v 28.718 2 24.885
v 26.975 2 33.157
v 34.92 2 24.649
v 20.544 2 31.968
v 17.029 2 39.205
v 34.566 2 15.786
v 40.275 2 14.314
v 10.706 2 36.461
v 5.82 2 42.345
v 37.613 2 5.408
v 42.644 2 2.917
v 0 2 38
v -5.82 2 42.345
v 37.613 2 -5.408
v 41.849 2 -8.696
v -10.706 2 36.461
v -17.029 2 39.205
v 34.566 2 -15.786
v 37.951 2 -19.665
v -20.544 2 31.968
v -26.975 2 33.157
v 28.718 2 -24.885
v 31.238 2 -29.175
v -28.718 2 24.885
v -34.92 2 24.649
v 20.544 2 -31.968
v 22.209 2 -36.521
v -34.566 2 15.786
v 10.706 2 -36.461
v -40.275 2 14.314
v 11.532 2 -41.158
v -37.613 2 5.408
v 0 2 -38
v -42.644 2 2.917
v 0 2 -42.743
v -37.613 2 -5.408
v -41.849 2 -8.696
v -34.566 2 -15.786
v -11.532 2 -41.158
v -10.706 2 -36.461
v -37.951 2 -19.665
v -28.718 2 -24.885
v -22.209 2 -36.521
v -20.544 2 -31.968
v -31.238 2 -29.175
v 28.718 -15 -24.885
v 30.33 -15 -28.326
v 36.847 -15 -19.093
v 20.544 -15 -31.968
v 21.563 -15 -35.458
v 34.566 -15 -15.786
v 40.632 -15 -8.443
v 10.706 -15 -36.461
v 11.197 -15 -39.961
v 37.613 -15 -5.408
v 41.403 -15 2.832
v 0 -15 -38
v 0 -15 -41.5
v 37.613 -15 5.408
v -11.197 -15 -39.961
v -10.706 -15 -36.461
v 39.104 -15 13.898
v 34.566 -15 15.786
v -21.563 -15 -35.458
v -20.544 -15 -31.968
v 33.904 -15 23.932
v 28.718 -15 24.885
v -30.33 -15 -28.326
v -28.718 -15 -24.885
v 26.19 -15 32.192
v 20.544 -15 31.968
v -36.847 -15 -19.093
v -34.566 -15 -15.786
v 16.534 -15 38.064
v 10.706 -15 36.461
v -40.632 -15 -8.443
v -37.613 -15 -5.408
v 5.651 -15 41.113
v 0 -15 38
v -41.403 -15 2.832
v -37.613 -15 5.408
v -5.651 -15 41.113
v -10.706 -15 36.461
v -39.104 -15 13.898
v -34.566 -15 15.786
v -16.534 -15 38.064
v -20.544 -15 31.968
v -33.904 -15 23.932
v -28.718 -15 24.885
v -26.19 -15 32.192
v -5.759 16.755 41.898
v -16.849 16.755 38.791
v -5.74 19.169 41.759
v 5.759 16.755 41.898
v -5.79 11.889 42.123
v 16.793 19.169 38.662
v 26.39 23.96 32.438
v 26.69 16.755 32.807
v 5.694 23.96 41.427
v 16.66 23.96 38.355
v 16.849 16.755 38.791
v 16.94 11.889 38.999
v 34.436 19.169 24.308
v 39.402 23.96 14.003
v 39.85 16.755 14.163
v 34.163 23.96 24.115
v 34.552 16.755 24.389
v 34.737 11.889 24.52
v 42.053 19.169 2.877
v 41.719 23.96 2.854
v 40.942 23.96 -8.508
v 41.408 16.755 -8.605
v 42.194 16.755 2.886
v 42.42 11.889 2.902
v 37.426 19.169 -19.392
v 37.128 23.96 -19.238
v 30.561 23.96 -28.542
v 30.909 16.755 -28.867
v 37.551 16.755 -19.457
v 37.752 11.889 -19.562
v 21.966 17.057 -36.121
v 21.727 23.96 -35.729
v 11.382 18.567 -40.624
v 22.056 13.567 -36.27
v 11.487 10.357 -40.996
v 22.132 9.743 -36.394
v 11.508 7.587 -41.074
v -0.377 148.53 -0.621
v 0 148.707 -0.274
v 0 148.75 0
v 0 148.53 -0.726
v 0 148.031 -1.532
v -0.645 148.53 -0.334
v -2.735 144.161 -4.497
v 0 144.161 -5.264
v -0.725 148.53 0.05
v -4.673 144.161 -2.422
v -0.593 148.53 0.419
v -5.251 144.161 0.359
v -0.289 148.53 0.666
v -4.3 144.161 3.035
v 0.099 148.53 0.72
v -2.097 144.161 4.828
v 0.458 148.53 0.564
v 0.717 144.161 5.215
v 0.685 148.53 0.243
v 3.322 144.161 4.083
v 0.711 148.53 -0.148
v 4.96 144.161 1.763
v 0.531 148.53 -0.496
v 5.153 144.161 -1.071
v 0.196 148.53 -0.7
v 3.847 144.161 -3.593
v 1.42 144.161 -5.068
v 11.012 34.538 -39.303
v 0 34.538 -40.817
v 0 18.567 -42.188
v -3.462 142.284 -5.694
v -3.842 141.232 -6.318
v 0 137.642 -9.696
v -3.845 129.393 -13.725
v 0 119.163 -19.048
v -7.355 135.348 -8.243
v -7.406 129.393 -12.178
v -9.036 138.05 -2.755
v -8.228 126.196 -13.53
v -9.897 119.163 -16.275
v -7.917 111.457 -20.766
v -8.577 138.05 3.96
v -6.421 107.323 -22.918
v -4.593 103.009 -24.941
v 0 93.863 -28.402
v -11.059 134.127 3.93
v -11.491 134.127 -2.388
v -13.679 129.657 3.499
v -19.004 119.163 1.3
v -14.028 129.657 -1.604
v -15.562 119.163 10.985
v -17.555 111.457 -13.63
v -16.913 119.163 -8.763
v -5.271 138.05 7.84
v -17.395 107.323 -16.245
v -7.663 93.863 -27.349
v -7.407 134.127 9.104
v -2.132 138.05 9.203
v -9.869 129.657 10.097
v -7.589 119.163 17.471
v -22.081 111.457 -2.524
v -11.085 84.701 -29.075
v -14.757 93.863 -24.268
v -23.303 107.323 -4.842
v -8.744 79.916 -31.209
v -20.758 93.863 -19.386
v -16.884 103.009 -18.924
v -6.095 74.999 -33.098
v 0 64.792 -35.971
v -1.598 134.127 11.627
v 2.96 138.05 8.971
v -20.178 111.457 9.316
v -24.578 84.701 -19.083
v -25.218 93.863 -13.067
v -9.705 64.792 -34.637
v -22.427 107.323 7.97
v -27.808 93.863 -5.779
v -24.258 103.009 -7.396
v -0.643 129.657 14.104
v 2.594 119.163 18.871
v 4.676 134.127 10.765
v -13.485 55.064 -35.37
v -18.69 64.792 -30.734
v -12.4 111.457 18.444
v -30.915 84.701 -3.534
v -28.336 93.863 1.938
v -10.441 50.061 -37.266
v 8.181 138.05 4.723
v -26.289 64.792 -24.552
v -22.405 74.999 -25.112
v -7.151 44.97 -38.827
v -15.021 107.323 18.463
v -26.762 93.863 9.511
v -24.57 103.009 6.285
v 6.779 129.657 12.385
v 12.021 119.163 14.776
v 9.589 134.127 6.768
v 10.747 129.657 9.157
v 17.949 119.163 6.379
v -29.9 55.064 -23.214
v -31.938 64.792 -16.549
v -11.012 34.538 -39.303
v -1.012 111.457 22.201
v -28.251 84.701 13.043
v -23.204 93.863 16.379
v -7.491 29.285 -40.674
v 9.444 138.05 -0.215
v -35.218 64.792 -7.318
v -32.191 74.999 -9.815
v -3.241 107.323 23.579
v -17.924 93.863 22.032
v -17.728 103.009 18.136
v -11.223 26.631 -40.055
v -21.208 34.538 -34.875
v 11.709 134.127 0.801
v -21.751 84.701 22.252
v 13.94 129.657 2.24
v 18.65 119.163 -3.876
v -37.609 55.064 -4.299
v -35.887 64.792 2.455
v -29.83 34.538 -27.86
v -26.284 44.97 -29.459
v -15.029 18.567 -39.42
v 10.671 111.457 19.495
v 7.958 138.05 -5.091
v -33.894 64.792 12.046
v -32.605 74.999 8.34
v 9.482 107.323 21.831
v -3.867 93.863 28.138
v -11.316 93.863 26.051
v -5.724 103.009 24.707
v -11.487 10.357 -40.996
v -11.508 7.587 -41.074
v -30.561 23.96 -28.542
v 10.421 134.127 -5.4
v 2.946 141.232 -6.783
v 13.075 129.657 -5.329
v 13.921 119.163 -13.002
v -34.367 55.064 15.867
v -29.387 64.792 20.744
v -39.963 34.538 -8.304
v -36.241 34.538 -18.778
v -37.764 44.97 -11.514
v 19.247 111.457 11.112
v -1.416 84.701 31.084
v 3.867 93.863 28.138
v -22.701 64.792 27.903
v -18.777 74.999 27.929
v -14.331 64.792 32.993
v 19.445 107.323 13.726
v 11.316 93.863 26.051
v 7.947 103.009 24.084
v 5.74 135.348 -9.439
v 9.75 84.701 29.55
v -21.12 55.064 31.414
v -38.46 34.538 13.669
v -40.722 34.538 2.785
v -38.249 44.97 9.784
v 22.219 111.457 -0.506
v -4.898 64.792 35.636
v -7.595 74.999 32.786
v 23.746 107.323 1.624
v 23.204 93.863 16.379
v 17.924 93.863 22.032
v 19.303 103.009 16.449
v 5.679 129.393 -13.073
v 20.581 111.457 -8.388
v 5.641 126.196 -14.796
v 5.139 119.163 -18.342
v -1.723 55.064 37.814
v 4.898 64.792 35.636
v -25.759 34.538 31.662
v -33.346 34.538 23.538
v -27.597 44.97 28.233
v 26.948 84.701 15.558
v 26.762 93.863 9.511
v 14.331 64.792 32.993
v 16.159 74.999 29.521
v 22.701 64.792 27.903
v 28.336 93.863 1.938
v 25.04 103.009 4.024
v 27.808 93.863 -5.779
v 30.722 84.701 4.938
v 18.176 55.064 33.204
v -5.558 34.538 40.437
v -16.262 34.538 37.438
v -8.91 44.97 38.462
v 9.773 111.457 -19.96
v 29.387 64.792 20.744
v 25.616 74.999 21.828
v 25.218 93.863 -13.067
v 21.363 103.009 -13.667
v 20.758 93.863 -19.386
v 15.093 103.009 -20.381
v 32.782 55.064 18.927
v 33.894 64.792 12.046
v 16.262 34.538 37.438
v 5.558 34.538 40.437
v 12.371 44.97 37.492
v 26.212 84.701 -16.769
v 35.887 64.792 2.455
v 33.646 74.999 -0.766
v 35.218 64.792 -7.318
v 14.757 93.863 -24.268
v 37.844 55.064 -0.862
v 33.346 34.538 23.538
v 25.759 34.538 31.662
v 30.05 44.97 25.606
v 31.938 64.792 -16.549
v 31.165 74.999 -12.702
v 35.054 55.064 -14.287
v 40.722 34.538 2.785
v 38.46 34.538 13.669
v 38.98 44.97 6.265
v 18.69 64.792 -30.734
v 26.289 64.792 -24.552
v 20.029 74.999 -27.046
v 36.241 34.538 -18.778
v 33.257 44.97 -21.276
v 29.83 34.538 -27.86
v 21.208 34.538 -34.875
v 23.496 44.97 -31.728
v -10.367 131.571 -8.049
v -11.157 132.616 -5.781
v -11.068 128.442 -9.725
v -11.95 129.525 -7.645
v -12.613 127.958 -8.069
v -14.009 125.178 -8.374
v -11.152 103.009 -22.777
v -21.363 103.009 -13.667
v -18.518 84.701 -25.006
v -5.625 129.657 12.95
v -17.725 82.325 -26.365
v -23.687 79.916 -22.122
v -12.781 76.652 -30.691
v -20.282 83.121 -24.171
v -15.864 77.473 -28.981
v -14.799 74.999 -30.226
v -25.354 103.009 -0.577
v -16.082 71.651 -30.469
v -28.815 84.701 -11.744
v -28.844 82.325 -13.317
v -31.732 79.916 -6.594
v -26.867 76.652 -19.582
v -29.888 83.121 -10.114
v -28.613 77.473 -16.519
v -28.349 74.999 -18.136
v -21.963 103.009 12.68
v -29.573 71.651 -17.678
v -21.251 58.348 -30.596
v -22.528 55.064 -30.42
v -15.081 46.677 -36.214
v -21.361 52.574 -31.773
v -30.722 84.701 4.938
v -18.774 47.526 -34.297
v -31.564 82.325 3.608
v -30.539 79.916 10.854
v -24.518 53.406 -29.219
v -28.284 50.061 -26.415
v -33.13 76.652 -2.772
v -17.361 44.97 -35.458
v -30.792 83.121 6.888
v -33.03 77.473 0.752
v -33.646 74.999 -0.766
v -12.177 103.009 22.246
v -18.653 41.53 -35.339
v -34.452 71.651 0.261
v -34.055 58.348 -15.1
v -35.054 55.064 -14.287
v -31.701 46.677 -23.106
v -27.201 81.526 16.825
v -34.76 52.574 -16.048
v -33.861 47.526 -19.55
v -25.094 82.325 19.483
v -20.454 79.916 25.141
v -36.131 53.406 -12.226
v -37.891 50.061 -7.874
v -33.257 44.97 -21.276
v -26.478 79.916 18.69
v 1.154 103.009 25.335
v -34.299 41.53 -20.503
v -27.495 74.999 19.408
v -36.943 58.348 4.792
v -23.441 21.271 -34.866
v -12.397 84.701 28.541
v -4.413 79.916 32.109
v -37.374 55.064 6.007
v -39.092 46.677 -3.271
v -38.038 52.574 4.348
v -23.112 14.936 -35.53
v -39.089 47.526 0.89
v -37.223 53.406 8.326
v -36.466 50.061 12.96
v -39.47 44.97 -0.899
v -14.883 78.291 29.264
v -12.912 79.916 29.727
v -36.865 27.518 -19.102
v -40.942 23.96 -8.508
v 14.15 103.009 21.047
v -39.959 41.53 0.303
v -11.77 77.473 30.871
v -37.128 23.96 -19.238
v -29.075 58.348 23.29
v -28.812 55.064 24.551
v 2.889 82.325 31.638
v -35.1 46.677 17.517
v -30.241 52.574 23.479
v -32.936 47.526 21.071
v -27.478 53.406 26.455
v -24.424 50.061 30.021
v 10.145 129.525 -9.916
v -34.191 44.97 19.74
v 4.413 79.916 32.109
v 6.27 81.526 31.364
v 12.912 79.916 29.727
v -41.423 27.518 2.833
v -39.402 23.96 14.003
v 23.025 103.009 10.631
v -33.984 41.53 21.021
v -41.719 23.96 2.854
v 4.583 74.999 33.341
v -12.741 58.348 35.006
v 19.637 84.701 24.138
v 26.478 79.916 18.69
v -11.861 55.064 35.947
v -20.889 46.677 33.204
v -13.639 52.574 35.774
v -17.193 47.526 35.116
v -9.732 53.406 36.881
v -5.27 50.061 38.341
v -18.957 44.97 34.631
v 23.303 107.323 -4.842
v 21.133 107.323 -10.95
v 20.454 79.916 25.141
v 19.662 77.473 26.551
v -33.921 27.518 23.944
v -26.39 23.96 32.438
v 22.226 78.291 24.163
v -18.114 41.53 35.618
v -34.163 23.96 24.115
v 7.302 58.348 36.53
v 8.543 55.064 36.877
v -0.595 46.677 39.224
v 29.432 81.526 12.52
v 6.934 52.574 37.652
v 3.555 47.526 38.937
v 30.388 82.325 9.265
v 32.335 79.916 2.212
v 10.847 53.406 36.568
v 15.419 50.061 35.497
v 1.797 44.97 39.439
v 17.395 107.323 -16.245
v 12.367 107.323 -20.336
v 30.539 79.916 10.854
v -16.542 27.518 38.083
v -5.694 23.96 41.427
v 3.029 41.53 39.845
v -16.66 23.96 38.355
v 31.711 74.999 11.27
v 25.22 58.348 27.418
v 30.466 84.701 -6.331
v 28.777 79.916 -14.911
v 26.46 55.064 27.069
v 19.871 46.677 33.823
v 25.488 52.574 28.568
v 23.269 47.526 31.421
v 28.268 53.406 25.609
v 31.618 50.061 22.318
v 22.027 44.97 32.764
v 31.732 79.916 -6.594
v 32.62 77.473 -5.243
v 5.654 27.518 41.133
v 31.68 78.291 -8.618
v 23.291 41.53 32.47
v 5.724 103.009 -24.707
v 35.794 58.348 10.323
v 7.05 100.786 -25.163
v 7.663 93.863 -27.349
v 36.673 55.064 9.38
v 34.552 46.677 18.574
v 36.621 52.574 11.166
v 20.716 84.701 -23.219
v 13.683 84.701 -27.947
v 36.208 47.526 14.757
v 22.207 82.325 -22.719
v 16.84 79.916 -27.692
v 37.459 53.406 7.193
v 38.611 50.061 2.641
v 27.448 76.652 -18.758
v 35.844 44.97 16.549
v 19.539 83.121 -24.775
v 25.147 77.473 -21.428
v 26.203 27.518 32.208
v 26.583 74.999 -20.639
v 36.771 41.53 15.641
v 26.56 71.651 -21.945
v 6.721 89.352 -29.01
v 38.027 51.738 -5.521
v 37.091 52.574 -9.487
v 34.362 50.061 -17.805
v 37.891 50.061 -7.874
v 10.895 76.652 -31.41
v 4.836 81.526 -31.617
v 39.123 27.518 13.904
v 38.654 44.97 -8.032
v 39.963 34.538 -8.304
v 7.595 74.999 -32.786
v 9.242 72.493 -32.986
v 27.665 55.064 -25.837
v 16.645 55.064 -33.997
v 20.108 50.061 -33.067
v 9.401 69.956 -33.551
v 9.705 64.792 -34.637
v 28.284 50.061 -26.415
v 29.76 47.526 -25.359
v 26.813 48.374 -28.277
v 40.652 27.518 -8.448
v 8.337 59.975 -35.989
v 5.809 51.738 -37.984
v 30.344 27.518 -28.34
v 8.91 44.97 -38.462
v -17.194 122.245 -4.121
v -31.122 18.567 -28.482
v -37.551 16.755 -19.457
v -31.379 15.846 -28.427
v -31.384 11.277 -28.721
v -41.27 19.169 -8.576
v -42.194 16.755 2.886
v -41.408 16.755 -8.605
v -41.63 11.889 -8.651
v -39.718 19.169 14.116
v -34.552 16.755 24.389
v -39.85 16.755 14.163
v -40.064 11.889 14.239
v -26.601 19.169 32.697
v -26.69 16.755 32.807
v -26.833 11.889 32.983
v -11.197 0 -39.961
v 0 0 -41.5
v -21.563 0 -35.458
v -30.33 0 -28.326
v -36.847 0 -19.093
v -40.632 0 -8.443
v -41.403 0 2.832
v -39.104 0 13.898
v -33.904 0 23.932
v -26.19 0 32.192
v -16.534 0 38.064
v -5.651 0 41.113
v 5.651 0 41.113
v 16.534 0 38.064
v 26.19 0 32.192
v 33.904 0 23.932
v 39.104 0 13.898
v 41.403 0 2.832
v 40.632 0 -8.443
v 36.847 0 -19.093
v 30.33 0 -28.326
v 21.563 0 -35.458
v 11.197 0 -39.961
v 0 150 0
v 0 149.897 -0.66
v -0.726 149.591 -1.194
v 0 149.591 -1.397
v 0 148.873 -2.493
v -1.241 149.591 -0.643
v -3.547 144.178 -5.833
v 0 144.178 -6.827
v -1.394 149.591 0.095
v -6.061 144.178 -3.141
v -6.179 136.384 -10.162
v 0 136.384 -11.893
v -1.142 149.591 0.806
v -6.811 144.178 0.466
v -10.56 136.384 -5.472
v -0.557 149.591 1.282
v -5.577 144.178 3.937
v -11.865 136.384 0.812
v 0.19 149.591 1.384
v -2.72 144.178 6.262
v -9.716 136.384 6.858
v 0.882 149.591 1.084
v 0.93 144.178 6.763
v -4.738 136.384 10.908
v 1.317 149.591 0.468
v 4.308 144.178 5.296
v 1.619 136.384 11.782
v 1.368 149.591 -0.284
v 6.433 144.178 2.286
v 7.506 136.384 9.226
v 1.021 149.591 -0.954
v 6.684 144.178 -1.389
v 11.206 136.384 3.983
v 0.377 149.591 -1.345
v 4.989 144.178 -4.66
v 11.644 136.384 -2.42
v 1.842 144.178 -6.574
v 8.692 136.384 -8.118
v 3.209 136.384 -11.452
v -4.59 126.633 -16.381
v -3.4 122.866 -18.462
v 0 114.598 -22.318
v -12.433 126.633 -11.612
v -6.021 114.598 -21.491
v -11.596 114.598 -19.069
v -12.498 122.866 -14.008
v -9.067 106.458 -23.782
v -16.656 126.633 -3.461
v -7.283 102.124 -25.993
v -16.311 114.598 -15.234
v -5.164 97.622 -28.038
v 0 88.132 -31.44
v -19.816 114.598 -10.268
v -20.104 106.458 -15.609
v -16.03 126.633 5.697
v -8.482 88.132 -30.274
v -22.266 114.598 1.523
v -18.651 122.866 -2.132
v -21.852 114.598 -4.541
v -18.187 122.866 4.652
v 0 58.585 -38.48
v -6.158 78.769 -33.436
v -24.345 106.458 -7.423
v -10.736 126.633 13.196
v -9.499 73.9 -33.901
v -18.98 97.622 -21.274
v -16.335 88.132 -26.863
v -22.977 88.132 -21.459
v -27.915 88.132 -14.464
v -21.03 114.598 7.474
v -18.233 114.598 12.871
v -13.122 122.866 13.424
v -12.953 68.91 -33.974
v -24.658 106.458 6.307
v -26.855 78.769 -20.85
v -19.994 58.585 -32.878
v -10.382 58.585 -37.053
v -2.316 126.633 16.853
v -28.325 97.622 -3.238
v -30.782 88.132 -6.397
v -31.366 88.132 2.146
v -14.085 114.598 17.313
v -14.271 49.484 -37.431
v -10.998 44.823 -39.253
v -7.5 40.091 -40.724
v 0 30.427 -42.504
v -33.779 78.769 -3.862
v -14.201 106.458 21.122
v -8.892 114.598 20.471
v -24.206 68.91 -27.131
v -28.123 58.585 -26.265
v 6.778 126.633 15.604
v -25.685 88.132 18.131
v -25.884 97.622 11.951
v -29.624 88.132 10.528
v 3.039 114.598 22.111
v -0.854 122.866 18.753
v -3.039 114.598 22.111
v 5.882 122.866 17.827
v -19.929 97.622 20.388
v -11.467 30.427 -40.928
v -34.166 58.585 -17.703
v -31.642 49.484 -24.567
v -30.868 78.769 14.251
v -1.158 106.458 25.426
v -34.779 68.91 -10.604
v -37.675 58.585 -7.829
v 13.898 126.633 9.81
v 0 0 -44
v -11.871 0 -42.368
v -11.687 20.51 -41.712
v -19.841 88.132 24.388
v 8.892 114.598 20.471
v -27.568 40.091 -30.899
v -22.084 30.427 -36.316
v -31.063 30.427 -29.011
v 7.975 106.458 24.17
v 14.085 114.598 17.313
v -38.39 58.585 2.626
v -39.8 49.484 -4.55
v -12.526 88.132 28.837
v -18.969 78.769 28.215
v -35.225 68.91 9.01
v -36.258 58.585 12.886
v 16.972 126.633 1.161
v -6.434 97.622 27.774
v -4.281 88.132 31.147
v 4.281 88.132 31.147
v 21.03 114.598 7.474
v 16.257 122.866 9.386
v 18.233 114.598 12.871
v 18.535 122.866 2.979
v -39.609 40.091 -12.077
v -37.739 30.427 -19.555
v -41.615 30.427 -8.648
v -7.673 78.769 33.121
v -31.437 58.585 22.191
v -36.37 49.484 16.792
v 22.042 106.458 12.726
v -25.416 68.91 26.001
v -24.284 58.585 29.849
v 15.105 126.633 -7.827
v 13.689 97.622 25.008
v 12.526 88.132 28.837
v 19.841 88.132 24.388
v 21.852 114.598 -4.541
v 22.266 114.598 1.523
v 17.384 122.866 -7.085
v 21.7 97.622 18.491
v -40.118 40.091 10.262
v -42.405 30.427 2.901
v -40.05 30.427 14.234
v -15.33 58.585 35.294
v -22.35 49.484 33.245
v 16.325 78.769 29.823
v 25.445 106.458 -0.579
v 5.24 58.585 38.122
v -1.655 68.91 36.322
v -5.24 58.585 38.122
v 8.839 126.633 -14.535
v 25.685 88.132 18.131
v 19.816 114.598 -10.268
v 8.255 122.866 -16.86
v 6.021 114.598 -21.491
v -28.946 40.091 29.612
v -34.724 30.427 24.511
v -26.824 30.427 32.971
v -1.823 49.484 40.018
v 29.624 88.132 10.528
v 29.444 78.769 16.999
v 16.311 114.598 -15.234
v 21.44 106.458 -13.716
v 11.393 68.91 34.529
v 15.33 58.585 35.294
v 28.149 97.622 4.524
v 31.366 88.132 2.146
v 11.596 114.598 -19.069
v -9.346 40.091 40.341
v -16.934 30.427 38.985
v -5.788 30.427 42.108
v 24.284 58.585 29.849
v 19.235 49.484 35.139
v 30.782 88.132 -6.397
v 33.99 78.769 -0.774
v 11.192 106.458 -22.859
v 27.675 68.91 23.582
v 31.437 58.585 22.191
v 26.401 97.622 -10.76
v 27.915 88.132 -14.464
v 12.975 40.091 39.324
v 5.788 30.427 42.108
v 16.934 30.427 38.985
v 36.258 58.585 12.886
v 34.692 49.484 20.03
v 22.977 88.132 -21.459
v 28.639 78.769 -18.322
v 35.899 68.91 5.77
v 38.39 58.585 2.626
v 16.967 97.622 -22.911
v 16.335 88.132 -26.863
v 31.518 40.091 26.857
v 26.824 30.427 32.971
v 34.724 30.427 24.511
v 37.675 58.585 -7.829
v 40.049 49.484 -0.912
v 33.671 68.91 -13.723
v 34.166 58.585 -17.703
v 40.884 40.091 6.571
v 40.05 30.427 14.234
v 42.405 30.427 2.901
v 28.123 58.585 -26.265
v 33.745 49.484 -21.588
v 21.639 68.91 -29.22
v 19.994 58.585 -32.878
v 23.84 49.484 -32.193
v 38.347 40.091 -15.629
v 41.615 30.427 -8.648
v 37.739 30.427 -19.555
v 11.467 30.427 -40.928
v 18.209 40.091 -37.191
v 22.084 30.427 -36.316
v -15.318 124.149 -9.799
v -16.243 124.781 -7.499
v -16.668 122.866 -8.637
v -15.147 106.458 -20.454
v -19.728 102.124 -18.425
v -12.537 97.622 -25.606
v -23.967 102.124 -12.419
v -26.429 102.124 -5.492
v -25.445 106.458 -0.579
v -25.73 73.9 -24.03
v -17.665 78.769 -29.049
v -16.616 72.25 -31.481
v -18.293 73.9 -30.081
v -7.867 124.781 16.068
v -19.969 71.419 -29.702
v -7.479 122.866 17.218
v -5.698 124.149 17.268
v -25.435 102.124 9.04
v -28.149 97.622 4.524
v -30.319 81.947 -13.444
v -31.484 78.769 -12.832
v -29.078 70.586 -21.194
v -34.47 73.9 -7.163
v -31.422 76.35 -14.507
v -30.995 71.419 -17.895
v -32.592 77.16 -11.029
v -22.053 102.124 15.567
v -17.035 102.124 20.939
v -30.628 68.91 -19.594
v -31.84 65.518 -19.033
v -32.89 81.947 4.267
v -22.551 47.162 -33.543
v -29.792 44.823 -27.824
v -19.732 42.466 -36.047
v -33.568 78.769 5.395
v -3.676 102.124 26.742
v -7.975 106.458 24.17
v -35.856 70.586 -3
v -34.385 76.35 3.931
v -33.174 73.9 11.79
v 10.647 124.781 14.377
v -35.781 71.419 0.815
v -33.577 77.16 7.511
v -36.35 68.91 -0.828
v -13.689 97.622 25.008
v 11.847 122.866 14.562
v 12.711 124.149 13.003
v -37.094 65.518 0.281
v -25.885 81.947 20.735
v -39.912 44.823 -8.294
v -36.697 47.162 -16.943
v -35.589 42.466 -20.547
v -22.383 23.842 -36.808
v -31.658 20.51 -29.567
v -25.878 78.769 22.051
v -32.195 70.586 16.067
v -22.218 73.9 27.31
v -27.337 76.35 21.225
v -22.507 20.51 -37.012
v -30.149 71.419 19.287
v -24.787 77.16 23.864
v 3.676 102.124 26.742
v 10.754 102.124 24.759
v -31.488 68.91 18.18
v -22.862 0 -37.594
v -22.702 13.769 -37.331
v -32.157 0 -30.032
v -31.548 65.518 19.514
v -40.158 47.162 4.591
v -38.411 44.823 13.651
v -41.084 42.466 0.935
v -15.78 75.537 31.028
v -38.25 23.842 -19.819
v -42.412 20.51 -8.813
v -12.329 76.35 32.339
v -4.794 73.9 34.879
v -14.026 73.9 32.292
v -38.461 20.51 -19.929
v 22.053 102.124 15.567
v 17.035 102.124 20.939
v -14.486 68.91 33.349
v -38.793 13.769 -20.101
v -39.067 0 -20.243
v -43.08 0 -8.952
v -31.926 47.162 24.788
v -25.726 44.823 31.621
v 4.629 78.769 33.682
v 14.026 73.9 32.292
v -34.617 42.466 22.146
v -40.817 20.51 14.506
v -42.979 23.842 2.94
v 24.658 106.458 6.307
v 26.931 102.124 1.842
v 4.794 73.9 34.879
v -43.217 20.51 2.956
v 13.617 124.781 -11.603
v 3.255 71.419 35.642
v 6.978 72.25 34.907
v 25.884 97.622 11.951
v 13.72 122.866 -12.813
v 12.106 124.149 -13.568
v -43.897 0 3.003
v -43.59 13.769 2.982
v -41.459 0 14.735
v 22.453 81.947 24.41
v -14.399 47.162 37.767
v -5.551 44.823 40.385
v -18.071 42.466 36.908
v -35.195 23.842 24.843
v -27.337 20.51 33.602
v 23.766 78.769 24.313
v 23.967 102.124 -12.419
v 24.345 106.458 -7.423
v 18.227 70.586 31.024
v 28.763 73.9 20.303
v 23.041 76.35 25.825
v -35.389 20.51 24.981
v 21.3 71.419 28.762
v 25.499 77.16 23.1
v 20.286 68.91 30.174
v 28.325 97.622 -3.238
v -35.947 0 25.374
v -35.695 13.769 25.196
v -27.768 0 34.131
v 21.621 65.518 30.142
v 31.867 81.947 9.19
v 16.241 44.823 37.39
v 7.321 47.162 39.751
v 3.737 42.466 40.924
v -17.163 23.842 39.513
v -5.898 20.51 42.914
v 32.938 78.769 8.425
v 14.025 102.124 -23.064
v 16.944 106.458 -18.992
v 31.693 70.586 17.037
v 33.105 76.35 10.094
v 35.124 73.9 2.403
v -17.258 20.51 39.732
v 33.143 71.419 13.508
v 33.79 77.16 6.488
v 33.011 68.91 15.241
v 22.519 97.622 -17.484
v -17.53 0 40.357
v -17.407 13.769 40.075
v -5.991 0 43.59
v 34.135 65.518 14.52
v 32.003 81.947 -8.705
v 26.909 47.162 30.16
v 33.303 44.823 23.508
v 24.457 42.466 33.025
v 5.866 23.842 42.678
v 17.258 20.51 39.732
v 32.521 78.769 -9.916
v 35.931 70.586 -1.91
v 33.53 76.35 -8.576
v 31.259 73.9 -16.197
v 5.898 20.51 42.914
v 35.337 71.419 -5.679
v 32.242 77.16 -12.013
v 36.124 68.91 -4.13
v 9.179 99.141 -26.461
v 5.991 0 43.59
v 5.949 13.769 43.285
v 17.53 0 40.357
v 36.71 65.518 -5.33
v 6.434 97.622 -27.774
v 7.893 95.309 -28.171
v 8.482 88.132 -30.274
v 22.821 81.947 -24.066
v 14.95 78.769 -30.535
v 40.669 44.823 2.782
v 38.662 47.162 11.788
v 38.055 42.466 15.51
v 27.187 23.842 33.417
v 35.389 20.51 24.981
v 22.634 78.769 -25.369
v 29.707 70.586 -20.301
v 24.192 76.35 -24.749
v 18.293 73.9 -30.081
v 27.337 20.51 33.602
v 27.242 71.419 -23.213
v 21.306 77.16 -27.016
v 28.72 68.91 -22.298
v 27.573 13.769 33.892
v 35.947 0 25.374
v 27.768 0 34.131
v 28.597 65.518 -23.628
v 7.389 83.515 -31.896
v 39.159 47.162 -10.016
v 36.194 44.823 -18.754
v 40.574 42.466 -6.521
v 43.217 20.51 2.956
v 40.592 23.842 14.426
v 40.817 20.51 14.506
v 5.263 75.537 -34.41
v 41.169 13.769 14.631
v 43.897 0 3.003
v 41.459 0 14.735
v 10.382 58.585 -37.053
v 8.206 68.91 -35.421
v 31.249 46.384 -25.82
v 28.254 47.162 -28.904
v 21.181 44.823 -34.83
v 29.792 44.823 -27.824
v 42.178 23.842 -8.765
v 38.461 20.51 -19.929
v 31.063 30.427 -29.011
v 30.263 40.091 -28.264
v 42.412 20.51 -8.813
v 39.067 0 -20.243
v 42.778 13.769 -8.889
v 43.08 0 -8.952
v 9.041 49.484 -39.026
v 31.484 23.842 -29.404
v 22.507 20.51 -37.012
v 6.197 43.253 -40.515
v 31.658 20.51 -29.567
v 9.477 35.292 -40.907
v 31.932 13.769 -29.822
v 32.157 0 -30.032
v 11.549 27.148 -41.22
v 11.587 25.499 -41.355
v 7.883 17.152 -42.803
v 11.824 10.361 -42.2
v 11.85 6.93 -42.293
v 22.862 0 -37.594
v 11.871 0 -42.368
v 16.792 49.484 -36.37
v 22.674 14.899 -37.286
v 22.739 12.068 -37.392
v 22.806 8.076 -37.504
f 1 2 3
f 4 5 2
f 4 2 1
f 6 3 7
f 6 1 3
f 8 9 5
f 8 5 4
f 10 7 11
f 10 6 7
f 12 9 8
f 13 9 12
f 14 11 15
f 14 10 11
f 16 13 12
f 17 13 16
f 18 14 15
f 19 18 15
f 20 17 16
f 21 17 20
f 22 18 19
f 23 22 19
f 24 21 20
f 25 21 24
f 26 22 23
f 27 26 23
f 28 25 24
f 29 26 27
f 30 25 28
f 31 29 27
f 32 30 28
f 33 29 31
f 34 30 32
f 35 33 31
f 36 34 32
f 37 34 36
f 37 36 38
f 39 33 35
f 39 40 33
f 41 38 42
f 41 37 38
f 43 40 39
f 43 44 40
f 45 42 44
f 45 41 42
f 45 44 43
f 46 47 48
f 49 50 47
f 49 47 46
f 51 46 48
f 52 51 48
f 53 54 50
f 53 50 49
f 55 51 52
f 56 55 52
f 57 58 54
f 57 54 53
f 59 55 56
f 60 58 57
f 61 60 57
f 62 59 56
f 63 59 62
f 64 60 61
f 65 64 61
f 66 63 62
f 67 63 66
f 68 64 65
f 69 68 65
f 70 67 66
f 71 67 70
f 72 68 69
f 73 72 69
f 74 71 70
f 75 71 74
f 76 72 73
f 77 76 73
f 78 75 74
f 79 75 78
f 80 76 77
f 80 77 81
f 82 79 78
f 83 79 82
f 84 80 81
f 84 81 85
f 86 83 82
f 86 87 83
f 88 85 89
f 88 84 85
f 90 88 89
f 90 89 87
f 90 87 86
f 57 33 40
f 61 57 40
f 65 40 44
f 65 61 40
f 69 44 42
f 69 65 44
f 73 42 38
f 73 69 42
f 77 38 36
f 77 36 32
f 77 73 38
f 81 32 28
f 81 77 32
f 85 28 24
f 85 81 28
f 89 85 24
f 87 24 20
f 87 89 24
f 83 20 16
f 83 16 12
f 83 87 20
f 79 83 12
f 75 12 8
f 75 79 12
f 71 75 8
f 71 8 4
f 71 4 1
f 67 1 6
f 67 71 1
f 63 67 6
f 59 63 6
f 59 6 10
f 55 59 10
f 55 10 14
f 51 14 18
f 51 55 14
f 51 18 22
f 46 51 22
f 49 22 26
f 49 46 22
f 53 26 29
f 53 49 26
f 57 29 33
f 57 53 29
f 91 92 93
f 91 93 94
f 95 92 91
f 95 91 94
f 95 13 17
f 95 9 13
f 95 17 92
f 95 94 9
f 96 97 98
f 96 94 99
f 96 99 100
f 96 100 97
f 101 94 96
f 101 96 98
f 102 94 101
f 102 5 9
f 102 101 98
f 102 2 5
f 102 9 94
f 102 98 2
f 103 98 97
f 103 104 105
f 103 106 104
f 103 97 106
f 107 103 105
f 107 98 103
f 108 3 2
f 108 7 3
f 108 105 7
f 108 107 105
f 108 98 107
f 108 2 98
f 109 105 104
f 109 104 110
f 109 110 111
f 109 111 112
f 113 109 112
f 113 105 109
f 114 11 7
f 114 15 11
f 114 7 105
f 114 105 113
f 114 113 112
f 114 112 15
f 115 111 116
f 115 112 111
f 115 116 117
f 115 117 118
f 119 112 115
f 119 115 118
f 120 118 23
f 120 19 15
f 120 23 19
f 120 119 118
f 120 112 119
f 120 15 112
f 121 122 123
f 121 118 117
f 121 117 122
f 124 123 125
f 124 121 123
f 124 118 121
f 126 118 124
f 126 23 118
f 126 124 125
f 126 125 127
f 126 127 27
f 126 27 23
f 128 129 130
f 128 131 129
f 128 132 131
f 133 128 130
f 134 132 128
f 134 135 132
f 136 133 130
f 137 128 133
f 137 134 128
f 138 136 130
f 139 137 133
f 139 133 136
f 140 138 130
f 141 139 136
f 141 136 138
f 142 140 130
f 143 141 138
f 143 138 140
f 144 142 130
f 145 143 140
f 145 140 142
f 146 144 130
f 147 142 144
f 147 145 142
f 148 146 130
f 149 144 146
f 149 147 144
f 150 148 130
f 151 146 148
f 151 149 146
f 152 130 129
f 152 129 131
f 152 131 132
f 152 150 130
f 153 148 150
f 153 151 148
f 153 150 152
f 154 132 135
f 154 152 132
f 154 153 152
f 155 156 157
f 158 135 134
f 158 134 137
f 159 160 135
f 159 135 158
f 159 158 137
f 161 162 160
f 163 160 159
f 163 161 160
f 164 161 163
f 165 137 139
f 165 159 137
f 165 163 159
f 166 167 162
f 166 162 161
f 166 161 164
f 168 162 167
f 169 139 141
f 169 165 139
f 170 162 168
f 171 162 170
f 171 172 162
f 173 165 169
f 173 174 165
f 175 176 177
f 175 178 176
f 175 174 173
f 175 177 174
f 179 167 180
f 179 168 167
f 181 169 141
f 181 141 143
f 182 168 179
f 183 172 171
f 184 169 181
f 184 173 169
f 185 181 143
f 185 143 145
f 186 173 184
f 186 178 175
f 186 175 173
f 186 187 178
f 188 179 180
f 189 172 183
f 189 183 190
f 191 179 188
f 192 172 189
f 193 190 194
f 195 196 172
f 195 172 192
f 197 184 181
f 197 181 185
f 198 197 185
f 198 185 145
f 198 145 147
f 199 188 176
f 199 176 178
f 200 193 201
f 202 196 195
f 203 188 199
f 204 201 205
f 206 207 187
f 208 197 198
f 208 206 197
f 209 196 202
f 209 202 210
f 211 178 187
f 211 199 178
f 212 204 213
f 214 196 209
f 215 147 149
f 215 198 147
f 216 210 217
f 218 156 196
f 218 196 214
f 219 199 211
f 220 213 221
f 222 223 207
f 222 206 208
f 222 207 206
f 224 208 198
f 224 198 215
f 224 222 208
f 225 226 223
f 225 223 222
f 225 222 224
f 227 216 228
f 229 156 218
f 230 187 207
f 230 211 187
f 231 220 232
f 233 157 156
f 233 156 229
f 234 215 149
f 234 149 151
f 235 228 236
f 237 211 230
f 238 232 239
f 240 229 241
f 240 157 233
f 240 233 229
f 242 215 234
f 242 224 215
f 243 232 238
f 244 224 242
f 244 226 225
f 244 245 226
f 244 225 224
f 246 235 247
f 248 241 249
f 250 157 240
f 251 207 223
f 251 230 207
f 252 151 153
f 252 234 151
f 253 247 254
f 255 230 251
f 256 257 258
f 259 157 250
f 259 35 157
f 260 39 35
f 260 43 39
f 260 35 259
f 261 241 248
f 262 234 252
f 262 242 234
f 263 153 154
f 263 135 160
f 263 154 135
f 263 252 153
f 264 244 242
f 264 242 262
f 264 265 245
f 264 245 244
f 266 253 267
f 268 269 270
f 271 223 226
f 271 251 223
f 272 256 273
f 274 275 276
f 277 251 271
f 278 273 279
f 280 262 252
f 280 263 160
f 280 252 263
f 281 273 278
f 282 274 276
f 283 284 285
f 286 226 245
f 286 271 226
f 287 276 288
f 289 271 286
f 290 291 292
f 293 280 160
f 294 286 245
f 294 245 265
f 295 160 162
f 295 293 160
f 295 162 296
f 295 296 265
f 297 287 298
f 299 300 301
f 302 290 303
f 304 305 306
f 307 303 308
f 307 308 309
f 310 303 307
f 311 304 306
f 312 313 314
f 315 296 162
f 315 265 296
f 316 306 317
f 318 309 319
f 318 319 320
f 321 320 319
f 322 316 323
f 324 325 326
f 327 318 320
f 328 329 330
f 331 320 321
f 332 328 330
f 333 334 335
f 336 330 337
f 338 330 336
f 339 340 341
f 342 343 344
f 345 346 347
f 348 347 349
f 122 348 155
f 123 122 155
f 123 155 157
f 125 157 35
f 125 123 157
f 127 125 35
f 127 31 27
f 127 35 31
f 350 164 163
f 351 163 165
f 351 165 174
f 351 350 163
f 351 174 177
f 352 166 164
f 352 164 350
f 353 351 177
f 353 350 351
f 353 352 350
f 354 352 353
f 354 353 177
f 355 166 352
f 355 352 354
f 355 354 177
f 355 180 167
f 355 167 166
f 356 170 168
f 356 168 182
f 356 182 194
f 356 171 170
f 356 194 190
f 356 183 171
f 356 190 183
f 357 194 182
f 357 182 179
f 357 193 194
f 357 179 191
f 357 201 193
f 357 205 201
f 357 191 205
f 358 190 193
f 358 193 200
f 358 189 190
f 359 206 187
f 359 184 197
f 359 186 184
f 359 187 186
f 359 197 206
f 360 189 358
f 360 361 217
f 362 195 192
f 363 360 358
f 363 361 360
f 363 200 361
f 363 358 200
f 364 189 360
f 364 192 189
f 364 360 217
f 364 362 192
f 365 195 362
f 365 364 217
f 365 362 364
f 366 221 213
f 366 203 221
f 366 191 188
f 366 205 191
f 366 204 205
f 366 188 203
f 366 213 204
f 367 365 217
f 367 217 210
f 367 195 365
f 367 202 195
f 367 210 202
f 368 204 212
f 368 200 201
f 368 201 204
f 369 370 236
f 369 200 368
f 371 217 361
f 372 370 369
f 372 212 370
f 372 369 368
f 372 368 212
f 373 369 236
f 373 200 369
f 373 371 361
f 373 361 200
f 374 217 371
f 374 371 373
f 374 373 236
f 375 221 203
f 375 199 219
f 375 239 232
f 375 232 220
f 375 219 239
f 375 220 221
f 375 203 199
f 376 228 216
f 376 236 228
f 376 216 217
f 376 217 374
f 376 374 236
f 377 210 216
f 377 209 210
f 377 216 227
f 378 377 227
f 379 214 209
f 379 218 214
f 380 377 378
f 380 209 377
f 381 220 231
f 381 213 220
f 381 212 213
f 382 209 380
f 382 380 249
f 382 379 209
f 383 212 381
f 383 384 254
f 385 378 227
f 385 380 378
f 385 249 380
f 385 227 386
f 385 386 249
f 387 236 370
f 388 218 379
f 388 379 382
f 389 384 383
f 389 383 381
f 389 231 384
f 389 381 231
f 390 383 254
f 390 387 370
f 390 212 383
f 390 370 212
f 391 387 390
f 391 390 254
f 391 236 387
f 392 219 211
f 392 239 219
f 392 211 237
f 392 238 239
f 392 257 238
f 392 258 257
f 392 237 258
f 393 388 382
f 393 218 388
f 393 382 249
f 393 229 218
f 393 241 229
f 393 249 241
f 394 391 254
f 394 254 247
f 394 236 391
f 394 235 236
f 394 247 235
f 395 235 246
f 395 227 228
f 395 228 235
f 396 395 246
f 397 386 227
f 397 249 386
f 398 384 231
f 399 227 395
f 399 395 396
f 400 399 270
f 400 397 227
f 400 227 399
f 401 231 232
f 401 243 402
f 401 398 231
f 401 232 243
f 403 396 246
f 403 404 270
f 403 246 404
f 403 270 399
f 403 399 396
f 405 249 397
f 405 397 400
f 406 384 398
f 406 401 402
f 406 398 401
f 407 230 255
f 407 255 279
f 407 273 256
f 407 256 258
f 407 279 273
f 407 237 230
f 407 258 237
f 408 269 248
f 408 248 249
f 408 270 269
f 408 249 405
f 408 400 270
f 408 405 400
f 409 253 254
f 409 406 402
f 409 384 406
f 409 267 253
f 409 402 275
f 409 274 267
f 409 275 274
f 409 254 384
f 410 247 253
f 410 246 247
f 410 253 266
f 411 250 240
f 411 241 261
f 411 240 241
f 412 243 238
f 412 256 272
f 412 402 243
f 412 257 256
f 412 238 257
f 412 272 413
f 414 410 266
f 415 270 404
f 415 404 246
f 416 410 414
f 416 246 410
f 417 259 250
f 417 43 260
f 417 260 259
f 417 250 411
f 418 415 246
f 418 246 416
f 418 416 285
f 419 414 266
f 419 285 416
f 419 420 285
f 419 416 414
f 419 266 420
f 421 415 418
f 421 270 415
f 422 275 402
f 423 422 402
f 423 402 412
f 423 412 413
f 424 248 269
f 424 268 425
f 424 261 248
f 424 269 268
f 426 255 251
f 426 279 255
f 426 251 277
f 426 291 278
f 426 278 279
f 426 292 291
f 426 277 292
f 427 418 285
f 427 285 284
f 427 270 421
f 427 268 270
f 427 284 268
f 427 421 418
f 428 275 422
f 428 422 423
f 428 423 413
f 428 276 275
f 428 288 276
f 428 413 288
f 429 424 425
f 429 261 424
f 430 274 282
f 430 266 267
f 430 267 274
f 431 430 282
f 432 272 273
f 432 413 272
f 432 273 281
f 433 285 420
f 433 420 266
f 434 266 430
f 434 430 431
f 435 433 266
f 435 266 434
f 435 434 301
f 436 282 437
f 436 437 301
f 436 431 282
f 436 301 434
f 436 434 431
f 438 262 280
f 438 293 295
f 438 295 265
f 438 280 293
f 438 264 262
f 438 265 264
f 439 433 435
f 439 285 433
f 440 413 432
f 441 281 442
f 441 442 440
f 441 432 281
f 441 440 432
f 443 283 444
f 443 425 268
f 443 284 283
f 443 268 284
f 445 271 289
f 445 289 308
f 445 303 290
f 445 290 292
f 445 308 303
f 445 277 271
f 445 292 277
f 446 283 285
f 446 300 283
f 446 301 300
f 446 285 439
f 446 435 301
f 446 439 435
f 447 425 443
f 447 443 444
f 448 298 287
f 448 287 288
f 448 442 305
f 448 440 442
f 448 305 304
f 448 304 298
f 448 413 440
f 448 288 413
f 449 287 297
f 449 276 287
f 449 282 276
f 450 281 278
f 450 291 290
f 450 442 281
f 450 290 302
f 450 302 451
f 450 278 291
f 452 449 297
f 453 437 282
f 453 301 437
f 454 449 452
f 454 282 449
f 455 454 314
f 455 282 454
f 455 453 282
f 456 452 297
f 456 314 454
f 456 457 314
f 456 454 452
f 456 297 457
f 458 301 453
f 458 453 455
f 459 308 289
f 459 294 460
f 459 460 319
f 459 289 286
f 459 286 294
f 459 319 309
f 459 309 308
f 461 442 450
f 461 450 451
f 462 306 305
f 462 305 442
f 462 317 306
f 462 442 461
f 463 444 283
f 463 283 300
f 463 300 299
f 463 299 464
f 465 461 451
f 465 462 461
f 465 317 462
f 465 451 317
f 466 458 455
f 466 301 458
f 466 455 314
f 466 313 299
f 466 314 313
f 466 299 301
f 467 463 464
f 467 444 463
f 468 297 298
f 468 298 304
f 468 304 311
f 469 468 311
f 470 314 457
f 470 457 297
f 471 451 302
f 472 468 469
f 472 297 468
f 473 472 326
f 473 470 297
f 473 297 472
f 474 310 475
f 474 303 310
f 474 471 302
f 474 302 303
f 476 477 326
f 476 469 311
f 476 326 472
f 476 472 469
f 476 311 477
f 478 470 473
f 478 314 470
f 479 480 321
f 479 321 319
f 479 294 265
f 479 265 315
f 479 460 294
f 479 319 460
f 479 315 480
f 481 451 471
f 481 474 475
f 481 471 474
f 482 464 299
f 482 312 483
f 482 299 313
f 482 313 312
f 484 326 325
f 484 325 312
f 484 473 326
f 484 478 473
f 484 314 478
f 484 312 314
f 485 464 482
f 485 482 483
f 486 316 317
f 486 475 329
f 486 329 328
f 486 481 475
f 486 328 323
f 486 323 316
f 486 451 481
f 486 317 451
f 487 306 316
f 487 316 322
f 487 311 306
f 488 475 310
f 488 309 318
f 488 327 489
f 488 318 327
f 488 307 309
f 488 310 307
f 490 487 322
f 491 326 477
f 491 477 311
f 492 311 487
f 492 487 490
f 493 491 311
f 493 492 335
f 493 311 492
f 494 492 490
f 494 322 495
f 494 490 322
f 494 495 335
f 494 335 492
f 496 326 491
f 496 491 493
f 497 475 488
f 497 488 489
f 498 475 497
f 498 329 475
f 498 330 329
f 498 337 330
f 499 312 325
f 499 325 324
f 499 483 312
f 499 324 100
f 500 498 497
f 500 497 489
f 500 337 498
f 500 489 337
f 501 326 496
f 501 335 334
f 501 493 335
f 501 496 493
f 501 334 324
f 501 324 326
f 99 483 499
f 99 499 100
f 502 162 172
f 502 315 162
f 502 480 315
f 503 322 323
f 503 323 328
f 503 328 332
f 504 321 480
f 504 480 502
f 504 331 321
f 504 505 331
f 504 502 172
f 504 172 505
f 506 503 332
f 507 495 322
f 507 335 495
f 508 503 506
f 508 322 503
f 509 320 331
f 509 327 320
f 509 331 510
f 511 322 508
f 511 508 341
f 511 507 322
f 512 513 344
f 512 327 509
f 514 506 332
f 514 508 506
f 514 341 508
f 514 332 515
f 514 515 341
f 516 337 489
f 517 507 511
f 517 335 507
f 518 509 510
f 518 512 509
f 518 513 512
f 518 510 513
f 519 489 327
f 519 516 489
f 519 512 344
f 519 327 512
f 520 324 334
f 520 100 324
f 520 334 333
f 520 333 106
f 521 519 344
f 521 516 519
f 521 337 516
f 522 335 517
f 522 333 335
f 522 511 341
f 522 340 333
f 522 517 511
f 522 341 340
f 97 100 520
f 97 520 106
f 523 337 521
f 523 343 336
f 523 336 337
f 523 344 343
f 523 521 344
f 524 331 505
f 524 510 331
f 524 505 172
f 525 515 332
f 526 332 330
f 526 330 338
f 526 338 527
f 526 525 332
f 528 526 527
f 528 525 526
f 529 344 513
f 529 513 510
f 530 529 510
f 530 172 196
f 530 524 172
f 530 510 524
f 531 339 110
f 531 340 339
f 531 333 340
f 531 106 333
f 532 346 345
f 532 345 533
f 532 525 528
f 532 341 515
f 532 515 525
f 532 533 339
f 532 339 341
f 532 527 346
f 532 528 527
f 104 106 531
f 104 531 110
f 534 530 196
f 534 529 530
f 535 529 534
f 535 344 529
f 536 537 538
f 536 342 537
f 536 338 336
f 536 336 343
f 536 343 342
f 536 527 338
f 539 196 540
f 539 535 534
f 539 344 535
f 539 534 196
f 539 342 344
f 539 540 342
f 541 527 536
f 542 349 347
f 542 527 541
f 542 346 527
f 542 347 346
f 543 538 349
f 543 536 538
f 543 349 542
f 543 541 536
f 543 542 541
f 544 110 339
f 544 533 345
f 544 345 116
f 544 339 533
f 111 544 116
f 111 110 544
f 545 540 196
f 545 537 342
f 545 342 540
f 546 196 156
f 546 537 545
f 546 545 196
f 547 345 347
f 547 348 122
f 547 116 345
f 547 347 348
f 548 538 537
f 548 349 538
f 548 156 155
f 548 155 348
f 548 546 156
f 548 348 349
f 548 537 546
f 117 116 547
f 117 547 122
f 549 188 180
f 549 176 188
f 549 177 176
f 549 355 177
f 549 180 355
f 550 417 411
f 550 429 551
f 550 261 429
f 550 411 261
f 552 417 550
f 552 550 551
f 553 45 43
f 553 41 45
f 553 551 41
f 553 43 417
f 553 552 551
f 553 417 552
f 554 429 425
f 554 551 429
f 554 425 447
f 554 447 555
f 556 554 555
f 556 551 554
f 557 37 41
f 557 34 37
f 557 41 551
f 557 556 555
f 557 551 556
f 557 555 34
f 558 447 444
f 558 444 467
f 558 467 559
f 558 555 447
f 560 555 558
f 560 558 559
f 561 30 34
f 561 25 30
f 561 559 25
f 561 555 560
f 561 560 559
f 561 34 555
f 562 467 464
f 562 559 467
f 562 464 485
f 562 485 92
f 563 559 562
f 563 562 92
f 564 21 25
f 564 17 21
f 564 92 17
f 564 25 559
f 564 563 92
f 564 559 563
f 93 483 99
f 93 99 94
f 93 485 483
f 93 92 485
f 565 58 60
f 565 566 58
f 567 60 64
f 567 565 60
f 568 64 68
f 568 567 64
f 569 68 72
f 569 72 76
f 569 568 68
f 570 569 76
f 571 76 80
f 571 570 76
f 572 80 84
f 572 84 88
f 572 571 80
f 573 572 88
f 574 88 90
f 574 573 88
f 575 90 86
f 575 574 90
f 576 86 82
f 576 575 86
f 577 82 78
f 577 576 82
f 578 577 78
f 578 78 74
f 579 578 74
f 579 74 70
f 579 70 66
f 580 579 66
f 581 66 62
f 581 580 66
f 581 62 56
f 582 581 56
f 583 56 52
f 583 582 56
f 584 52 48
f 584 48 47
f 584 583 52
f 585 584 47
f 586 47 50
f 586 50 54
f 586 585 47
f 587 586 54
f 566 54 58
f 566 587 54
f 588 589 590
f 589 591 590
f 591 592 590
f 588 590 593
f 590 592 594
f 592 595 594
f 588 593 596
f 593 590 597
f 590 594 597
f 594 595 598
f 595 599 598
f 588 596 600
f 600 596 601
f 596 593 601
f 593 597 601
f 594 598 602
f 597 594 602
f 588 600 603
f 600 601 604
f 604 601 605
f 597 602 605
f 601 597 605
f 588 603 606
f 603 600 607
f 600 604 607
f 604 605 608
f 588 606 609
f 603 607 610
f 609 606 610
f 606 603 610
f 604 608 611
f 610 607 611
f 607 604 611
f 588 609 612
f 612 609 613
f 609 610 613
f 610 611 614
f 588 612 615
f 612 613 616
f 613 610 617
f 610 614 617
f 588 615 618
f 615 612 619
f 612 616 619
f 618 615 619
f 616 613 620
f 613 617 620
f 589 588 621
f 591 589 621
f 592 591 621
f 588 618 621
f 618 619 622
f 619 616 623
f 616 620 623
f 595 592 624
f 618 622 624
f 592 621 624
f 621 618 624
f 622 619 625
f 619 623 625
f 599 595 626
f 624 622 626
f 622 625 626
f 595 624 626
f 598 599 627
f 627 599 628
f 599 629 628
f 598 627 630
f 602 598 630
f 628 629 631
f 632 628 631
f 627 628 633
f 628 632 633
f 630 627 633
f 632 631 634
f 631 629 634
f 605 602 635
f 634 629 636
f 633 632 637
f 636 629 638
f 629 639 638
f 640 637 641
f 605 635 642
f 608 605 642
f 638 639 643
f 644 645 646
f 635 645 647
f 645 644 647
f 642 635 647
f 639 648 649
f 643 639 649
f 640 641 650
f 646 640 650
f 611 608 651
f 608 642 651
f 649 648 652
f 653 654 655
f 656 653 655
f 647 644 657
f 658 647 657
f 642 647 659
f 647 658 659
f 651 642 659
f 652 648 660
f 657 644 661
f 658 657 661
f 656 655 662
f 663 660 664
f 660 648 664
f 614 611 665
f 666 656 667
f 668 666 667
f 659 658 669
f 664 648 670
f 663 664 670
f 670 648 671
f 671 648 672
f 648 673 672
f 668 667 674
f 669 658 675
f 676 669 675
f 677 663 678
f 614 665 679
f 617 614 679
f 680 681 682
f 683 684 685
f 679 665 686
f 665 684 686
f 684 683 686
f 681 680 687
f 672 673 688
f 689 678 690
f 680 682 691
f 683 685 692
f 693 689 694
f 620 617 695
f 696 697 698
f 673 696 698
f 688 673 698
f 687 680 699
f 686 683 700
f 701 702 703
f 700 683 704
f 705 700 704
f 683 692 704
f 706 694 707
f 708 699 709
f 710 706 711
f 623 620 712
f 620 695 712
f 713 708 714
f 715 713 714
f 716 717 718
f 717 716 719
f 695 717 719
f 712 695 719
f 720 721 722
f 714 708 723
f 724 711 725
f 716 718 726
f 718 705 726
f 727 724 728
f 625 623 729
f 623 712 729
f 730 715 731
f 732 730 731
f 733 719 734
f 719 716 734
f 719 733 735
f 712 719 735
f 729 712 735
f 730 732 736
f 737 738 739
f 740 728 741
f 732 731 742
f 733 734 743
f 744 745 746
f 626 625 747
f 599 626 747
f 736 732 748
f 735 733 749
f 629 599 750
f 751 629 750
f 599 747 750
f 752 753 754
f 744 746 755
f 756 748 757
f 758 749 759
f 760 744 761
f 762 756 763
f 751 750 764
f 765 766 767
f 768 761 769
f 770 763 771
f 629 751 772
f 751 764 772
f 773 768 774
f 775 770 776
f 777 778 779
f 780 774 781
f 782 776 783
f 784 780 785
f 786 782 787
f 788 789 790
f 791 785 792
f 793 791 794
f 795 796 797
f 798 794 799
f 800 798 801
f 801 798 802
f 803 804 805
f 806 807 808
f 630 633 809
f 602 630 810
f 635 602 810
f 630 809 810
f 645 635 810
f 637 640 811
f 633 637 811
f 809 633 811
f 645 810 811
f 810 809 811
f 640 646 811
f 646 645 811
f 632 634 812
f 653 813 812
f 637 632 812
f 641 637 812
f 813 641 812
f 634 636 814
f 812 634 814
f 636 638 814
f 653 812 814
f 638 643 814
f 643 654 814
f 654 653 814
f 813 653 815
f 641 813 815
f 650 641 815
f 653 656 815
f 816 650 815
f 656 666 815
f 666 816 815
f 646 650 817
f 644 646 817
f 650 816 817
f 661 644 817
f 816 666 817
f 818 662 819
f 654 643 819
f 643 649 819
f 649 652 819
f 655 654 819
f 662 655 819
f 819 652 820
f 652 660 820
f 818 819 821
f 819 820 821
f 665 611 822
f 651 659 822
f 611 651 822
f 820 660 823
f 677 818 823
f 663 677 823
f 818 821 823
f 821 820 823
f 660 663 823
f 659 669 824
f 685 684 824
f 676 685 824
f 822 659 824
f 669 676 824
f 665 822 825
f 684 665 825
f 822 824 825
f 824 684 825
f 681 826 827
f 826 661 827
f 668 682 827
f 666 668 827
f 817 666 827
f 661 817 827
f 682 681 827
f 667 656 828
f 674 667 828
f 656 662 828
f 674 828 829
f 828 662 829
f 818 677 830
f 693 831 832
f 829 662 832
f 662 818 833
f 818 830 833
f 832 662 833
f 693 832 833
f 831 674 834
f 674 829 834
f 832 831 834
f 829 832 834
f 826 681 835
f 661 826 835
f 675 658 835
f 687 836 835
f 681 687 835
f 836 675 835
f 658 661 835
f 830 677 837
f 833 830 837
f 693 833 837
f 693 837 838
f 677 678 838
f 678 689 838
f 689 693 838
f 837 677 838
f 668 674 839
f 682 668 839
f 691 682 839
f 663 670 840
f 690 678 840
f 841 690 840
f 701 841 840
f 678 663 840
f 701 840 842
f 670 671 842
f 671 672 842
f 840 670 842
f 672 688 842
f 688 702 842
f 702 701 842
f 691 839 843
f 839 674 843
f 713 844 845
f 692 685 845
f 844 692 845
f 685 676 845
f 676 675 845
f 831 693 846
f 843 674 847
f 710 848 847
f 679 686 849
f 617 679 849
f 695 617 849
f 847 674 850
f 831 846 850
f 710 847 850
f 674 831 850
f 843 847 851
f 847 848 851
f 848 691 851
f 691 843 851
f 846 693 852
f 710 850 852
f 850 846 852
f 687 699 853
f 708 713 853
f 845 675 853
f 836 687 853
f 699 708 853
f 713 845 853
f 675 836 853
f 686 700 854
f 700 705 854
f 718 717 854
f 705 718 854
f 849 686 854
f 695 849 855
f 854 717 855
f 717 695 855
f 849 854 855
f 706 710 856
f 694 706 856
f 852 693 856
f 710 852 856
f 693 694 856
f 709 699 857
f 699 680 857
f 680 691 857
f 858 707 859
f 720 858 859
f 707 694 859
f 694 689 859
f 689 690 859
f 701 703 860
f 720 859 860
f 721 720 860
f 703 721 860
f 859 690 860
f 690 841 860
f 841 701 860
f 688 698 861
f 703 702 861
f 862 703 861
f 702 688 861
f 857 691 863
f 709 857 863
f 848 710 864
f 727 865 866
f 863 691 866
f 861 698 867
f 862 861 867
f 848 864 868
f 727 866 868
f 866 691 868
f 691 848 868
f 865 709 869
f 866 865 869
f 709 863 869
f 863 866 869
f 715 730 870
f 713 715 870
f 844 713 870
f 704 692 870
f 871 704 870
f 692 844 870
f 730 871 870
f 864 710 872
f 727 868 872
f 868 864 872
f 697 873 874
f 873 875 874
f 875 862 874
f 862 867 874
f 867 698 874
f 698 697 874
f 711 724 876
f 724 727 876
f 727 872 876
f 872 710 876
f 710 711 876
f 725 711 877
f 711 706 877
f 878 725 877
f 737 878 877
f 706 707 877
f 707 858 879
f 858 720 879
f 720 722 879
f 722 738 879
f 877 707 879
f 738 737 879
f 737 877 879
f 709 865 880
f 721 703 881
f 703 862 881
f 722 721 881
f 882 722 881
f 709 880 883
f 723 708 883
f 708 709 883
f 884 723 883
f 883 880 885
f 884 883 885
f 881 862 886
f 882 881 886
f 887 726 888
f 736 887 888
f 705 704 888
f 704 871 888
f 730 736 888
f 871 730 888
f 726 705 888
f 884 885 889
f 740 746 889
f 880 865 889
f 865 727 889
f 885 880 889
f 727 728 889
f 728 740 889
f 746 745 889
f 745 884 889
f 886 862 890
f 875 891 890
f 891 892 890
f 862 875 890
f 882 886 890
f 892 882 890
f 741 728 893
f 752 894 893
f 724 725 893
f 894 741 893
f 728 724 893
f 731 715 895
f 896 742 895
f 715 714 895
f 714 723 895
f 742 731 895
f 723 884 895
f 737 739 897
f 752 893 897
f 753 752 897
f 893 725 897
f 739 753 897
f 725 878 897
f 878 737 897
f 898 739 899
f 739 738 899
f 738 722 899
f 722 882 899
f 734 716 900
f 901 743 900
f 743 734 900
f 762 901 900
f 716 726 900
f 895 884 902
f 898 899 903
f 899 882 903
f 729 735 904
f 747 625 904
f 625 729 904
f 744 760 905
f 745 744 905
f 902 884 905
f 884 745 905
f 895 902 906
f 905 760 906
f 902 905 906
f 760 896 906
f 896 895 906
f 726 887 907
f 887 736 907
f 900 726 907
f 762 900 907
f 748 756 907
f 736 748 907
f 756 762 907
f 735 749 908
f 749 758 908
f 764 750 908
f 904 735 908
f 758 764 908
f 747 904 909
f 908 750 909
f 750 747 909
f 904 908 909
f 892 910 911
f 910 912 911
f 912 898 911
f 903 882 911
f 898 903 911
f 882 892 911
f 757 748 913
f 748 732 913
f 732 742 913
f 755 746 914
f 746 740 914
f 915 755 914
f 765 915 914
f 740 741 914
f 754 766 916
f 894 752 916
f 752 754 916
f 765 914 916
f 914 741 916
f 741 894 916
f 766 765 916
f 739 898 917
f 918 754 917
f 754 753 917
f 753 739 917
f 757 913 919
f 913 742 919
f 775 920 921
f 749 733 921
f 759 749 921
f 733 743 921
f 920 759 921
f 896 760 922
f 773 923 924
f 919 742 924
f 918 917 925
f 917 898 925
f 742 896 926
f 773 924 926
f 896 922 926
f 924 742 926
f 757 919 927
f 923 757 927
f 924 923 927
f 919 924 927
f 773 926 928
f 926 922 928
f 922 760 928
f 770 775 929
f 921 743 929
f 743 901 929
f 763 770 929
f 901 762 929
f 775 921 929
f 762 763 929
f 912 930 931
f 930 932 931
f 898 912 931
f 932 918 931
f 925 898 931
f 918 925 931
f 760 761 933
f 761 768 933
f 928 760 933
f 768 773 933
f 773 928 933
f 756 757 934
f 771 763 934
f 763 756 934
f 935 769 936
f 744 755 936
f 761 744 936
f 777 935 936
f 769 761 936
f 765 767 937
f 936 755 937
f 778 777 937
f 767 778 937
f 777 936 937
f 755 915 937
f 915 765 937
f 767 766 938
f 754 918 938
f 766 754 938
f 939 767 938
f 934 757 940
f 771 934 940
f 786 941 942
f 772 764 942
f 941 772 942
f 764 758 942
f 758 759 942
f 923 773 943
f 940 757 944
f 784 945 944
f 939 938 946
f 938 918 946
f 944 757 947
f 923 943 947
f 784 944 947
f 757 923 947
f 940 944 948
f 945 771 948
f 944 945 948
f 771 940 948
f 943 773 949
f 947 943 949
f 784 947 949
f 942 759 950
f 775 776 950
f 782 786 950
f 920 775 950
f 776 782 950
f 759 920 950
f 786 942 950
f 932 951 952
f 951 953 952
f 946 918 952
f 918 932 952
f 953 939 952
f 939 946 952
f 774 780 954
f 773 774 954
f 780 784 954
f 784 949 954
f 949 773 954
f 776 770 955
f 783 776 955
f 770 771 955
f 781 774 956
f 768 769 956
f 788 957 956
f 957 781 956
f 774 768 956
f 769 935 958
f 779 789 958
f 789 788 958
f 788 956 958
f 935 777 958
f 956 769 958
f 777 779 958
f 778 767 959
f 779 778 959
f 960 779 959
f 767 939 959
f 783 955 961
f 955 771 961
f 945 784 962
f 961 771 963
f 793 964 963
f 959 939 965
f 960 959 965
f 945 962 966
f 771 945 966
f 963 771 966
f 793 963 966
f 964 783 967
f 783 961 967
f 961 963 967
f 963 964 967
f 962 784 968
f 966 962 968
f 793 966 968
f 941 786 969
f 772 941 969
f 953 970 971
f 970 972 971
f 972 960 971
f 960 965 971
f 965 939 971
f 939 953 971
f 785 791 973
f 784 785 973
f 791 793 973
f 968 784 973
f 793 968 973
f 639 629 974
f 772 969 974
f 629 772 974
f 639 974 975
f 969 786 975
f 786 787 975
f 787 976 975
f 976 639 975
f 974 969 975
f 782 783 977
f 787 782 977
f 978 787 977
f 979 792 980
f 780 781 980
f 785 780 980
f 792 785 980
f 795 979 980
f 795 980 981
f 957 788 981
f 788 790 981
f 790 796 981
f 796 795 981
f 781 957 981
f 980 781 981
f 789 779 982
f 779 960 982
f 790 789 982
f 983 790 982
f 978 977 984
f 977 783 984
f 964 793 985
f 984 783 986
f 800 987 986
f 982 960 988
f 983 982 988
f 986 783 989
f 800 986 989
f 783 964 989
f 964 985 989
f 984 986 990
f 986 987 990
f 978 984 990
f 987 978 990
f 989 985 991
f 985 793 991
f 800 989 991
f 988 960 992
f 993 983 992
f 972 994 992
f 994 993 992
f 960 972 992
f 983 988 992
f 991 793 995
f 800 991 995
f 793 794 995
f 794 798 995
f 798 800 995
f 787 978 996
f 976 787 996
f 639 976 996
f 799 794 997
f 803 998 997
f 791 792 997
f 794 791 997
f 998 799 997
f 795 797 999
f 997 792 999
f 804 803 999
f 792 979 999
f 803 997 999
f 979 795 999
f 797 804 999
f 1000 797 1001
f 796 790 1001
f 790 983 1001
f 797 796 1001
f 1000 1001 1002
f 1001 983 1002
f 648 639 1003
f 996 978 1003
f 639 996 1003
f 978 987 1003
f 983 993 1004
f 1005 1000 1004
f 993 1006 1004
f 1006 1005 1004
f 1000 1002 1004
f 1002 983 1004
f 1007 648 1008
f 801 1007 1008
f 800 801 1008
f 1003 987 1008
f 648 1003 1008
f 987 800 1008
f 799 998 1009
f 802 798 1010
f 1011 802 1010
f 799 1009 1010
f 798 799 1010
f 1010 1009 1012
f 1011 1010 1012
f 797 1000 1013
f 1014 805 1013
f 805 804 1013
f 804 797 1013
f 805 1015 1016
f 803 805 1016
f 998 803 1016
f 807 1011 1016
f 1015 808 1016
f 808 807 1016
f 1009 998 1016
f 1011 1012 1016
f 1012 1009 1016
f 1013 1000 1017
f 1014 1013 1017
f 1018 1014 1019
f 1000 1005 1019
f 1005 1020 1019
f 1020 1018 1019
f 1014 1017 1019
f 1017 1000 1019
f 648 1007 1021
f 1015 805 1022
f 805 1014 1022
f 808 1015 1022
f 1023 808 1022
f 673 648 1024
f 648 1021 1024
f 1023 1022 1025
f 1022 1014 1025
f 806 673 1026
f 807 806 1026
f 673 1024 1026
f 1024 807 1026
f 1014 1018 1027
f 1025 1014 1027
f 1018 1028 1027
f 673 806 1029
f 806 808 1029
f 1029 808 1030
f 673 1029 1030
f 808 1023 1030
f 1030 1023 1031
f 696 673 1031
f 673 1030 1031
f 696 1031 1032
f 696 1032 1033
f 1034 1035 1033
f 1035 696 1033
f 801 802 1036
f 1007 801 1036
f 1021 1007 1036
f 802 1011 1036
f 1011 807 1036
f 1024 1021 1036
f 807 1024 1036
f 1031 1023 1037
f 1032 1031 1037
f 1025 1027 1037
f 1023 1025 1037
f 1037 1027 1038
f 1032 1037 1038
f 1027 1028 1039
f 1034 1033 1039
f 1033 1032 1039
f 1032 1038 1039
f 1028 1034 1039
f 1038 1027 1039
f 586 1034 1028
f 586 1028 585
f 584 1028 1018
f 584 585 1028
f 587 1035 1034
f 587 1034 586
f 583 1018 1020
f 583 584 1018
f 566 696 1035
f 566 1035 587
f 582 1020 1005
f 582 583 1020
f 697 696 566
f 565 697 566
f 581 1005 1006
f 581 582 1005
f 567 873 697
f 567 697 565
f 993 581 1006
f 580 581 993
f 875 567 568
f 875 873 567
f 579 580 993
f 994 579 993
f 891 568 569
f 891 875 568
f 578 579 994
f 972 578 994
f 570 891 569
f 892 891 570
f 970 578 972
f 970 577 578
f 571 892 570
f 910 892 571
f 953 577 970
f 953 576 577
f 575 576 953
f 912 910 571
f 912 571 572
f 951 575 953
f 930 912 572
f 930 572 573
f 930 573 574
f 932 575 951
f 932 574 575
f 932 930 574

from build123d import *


with BuildPart() as part:
    # Sketch1 → Revolve1 (revolve)
    with BuildSketch(Plane.XY):
        with BuildLine():
            Line((41.5, 0), (44, 0))
            add(Edge.make_bspline(
                [(0, 150), (9.014979846, 150), (44, 84.407059953), (44, 0)],
                knots=[0, 0, 0, 0, 1, 1, 1, 1], degree=3))
            Line((0, 150), (0, 148.75))
            add(Edge.make_bspline(
                [(0, 148.75), (0.06239056, 148.75), (0.161743714, 148.739451329), (0.553973413, 148.630839322), (1.237514939, 148.274478014), (2.294281092, 147.453869912), (3.515158737, 146.254254098), (4.869505468, 144.690429147), (6.822941266, 142.138302248), (9.499352835, 138.103007179), (12.977615857, 131.992355554), (17.844010447, 122.253564223), (24.126426873, 107.276162171), (30.07944231, 89.023648), (34.291265548, 72.73001568), (37.086864573, 59.732316722), (39.431337241, 46.024275958), (41.236927587, 31.67713195), (42.219521942, 19.234766651), (42.635628651, 9.351465349), (42.726851303, 4.415615123), (42.743022792, 2.06245776), (42.743432753, 2)],
                knots=[0, 0, 0, 0, 0.015547466, 0.031094932, 0.062189864, 0.093284797, 0.124379729, 0.155474661, 0.186569593, 0.248759458, 0.310949322, 0.373139186, 0.497518915, 0.621898644, 0.684088508, 0.746278373, 0.808468237, 0.870658102, 0.932847966, 0.963942898, 0.991309547, 0.992055204, 0.992055204, 0.992055204, 0.992055204], degree=3))
            Line((42.743432753, 2), (38, 2))
            Line((38, 2), (38, -15))
            Line((38, -15), (41.5, -15))
            Line((41.5, -15), (41.5, 0))
        make_face()
    revolve(axis=Axis((0, 0, 0), (0, 1, 0)))


solid = part.part
